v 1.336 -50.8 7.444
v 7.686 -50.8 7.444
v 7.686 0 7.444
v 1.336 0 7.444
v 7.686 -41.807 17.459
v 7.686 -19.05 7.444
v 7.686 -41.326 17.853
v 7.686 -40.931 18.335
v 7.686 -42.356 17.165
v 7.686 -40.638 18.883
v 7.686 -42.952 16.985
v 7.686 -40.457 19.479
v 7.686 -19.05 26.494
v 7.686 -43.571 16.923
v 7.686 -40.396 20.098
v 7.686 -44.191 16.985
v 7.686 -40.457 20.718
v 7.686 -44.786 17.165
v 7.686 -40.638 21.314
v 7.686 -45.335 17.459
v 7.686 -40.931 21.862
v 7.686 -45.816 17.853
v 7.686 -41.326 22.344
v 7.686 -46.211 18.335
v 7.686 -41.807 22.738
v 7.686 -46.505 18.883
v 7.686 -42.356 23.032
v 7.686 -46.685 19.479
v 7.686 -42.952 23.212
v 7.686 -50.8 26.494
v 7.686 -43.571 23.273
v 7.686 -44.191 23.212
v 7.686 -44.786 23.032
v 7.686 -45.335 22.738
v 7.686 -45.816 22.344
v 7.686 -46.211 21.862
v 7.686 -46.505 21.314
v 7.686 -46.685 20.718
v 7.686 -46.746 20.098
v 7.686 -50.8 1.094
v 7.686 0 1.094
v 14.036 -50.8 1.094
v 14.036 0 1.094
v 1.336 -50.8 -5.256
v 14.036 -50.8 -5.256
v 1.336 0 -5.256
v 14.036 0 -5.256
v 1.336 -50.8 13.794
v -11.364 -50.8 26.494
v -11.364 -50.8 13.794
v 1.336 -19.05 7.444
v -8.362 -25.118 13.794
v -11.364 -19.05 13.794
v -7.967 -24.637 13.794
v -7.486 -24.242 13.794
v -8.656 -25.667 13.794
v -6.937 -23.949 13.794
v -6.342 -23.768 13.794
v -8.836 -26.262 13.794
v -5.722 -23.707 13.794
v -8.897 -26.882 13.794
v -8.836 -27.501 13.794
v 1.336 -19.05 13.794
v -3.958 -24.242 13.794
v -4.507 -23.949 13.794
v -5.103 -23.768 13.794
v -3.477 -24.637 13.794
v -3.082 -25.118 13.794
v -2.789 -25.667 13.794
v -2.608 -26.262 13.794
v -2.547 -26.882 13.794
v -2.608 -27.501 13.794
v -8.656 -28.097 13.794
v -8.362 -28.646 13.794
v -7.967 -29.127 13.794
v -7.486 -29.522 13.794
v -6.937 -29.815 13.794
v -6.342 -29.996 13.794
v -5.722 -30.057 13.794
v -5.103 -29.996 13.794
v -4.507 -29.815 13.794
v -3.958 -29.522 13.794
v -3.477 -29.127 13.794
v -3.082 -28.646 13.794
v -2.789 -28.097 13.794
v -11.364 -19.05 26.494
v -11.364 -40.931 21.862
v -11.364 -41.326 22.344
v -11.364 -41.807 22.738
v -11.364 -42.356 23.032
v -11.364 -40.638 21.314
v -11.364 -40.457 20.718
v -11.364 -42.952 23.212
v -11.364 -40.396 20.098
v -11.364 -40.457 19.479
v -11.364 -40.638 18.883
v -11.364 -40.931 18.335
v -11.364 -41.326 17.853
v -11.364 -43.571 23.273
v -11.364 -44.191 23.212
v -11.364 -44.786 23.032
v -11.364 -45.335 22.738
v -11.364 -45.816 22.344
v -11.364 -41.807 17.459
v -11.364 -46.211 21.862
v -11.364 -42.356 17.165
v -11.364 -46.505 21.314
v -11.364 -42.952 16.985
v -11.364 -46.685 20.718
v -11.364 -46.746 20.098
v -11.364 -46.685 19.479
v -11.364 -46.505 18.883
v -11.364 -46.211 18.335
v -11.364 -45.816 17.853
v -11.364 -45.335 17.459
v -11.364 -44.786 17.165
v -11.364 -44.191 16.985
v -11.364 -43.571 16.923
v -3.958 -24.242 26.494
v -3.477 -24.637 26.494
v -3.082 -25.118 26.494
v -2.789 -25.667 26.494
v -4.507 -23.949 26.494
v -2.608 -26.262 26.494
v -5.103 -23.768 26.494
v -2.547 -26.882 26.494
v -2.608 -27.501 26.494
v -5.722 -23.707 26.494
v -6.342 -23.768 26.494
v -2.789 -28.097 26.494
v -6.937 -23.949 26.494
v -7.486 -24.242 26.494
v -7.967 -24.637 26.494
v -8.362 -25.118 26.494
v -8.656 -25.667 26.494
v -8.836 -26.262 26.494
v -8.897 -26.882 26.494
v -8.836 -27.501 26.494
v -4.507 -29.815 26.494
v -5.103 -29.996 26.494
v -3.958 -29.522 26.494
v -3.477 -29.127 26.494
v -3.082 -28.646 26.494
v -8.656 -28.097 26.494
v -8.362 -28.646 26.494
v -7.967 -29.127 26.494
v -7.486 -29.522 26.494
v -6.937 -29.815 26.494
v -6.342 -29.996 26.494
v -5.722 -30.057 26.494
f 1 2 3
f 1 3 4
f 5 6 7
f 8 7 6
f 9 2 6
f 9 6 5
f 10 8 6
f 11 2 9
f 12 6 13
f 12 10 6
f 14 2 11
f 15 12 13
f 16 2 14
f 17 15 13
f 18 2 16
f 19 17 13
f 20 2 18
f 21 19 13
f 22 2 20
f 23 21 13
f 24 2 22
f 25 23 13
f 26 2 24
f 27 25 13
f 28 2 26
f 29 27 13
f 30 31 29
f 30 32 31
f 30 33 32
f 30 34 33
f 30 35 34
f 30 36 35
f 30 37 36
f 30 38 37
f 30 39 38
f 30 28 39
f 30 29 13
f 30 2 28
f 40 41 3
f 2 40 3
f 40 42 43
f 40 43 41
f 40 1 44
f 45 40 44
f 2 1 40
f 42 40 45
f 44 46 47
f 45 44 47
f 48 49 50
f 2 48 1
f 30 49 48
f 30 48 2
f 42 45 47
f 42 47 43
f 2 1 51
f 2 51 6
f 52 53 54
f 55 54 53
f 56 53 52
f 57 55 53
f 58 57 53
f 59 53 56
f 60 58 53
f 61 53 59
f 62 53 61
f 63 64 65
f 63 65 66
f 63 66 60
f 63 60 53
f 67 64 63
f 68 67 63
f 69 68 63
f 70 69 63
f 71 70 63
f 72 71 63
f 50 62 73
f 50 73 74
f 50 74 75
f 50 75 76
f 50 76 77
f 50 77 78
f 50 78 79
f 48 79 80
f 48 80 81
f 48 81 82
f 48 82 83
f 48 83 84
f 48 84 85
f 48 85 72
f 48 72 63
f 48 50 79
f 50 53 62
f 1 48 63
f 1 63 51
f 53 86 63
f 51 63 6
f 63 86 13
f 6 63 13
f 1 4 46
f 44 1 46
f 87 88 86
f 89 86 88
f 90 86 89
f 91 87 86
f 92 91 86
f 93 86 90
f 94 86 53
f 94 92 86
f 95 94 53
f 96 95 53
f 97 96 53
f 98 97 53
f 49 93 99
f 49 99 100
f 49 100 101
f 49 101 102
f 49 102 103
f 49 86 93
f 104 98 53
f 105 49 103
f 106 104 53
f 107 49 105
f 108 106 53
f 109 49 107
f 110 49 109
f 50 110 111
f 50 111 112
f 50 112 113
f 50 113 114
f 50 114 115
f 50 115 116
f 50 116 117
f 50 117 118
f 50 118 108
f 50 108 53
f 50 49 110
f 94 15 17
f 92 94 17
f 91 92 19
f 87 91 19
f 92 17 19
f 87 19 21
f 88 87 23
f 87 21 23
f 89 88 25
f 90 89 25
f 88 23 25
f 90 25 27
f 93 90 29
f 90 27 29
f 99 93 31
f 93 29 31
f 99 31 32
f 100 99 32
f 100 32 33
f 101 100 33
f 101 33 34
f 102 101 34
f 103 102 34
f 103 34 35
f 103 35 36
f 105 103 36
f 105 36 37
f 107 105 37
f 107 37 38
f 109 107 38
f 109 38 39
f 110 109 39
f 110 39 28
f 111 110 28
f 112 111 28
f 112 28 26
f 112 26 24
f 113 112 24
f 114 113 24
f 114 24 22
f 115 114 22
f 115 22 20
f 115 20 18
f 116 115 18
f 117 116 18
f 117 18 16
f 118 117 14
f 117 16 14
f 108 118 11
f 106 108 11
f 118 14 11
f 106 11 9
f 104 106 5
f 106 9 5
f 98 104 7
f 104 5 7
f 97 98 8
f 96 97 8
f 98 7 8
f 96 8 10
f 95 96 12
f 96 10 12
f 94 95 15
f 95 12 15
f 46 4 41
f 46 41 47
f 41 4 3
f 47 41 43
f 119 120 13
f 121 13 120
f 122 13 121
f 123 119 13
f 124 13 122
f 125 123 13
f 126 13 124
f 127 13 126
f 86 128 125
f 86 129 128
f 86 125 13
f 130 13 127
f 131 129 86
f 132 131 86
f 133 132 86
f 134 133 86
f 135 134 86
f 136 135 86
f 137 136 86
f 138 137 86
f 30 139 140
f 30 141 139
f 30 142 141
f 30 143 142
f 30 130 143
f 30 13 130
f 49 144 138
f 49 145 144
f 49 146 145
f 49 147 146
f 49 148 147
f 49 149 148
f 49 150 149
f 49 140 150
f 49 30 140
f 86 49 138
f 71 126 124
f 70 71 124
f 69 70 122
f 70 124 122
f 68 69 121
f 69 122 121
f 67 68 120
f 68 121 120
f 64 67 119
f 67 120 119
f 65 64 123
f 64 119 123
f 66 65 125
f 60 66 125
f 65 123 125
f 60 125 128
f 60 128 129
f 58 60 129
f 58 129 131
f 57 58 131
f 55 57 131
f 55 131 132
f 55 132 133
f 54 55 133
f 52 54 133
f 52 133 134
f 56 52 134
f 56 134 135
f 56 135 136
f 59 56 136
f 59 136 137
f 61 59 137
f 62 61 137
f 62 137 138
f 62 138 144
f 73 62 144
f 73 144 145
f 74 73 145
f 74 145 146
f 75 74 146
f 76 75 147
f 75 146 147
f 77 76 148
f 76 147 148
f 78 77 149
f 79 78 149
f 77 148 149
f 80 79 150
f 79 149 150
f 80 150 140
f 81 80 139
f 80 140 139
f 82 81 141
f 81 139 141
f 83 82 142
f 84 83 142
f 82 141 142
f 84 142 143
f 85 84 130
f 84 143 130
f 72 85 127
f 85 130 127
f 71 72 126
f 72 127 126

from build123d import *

# Parameters (mm, degrees)
F1_DEPTH = 50.8
F3_DEPTH = 31.75
F4_R     = 3.175
F5_DEPTH = 19.051
F6_R     = 3.175
F7_DEPTH = 31.751


with BuildPart() as f1:
    # F0 (on Front) → F1 (new body)
    with BuildSketch(Plane.XZ):
        Polygon((7.686454, 7.444258), (1.336454, 7.444258), (1.336454, -5.255742), (14.036454, -5.255742), (14.036454, 1.094258), (7.686454, 1.094258), align=None)
    extrude(amount=F1_DEPTH)


with BuildPart() as f3:
    # F2 (on face) → F3 (new body)
    with BuildSketch(Plane.XZ.offset(50.8)):
        Polygon((1.336454, 13.794258), (1.336454, 7.444258), (7.686454, 7.444258), (7.686454, 26.494258), (-11.363546, 26.494258), (-11.363546, 13.794258), align=None)
    extrude(amount=-F3_DEPTH)

    # F4 (on face) → F5 (cut, through all)
    with BuildSketch(Plane.YZ.offset(7.686454)):
        with Locations((-43.571215, 20.098496)):
            Circle(F4_R)
    extrude(amount=-F5_DEPTH, mode=Mode.SUBTRACT)

    # F6 (on face) → F7 (cut, through all)
    with BuildSketch(Plane.XY.offset(26.494258)):
        with Locations((-5.722302, -26.881824)):
            Circle(F6_R)
    extrude(amount=-F7_DEPTH, mode=Mode.SUBTRACT)


solid = Compound([f1.part, f3.part])
